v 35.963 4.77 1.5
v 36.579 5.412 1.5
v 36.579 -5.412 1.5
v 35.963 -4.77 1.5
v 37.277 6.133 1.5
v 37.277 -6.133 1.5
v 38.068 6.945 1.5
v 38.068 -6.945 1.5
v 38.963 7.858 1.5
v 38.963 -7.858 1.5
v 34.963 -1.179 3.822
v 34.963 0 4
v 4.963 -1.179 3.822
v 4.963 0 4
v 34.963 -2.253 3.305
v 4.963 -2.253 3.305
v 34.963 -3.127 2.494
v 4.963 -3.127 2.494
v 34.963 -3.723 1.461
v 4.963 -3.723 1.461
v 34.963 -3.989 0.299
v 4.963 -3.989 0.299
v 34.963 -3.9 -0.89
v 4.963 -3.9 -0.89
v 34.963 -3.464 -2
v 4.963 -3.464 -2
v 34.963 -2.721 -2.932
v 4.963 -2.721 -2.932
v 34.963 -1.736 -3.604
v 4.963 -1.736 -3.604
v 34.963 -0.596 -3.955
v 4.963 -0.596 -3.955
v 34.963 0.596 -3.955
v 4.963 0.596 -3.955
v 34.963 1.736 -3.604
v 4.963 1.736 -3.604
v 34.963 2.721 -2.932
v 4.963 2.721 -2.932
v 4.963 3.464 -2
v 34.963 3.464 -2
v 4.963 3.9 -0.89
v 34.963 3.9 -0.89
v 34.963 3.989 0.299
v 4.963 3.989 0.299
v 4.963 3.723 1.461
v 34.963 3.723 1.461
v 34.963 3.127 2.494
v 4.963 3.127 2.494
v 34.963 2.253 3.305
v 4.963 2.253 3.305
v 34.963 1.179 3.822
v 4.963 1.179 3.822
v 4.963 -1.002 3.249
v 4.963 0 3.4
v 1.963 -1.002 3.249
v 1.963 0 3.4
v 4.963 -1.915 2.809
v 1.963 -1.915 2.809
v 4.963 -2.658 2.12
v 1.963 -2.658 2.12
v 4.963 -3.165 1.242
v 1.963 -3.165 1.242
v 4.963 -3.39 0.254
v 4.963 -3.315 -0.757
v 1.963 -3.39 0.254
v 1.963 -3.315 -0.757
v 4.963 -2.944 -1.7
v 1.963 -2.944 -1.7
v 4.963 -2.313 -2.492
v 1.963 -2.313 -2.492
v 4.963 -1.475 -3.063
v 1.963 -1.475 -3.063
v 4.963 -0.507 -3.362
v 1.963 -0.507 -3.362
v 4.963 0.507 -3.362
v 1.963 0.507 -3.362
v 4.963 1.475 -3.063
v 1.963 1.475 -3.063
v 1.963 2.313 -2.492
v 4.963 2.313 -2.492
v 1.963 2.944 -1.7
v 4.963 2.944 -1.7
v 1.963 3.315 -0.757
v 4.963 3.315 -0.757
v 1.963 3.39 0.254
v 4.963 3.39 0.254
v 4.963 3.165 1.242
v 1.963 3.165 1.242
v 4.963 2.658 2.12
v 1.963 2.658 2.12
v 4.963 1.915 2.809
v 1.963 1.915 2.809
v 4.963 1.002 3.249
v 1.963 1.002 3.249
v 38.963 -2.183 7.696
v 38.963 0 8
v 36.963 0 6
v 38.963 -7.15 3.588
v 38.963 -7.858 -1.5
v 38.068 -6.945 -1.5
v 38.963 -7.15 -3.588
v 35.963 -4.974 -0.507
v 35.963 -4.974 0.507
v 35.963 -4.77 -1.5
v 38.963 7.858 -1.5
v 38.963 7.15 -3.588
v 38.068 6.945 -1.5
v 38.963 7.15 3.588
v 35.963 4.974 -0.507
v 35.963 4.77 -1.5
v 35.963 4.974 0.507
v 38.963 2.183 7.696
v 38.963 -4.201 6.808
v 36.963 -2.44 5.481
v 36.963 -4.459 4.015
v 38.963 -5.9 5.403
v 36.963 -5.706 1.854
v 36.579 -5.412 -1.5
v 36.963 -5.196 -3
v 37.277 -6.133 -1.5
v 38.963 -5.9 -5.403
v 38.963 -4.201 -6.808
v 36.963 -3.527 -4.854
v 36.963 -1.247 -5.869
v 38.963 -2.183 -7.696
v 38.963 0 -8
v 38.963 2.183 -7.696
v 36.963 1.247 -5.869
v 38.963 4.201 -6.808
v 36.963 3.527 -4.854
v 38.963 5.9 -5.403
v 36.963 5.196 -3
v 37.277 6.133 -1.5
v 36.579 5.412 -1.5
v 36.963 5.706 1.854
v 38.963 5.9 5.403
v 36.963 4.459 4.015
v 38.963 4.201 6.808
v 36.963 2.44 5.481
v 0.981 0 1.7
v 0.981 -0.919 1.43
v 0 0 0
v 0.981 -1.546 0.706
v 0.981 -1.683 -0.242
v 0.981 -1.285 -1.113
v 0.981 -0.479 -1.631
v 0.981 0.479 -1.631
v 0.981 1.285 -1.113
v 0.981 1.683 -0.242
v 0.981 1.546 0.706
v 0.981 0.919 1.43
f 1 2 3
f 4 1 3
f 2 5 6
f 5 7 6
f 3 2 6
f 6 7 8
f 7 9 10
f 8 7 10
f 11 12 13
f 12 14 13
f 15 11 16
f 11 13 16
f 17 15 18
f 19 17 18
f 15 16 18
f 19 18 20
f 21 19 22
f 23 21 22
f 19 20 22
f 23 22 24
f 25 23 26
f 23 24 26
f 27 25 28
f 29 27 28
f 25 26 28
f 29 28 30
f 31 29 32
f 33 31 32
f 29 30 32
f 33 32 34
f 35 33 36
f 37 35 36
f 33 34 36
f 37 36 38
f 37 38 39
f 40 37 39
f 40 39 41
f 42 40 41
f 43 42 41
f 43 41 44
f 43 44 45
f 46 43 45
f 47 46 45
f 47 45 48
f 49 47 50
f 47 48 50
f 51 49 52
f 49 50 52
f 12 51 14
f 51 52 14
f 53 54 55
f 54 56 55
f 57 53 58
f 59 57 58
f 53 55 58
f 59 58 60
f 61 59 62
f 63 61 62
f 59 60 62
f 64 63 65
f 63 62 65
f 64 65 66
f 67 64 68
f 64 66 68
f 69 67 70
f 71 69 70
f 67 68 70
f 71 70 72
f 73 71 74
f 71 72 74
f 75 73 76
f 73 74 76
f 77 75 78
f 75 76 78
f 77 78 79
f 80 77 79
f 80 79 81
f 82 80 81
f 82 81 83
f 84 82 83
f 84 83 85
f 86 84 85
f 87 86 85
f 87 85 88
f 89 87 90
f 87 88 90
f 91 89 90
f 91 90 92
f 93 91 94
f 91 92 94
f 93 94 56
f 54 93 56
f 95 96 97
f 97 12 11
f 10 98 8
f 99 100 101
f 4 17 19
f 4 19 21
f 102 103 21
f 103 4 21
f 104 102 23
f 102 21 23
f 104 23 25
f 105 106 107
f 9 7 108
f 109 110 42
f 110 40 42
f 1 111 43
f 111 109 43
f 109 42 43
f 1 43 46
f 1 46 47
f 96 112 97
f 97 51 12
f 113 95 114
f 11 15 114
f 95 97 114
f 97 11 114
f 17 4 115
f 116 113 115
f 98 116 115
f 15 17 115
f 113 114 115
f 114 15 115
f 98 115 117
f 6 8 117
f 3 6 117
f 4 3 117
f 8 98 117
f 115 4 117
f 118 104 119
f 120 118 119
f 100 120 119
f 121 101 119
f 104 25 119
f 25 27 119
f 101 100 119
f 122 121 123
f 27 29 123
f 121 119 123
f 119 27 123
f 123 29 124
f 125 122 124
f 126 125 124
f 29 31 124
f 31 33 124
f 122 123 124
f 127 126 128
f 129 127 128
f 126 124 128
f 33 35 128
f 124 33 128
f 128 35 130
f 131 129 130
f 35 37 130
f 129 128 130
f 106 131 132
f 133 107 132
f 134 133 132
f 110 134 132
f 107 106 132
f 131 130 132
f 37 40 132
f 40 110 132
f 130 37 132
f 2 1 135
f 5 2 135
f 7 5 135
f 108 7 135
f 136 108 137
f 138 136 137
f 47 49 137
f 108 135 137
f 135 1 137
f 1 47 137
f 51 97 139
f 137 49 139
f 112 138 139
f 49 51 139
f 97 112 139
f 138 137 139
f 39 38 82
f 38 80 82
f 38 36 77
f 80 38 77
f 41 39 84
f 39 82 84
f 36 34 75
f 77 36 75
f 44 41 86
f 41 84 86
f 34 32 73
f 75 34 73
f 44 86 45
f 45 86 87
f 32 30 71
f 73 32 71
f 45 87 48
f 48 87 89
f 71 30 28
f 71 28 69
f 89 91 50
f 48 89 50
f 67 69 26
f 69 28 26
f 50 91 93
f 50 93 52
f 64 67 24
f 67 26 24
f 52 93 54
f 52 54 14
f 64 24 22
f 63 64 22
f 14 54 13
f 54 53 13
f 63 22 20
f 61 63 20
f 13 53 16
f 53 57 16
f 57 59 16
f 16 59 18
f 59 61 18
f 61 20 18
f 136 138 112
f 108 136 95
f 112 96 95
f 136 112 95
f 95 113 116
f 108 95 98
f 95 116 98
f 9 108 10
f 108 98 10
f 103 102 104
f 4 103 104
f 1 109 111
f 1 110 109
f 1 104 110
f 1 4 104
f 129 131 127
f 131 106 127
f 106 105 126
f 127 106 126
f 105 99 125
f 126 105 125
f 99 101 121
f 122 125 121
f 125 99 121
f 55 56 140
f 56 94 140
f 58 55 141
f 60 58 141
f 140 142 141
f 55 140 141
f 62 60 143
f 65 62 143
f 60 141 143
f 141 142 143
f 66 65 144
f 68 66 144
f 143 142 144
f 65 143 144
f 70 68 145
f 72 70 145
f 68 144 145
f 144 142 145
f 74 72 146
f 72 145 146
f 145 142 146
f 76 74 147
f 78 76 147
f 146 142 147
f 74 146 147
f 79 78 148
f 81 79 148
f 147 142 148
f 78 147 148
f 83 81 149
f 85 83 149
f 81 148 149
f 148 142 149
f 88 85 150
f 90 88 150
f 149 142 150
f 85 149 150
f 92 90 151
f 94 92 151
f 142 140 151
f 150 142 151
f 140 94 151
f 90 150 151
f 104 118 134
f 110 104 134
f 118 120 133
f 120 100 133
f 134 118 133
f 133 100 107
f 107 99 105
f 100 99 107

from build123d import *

# Parameters (mm, degrees)
F3_DEPTH = 3


with BuildPart() as f1:
    # F0 (on Front) → F1 (revolve)
    with BuildSketch(Plane.XZ):
        Polygon((34.962991, 4), (34.962991, 0), (38.962991, 0), (38.962991, 8), align=None)
        Polygon((4.962991, 3.4), (4.962991, 0), (34.962991, 0), (34.962991, 4), (4.962991, 4), align=None)
        Polygon((1.962991, 3.4), (0, 0), (4.962991, 0), (4.962991, 3.4), align=None)
    revolve(axis=Axis((9.715057, 0, 0), (1, 0, 0)))

    # F2 (on face) → F3 (cut)
    with BuildSketch(Plane.YZ.offset(38.962991)):
        with BuildLine():
            Line((7.858117, 1.5), (-7.858117, 1.5))
            ThreePointArc((-7.858117, 1.5), (-8, 0), (-7.858117, -1.5))
            Line((-7.858117, -1.5), (7.858117, -1.5))
            ThreePointArc((7.858117, -1.5), (7.96445, -0.753348), (8, 0))
            ThreePointArc((8, 0), (7.96445, 0.753348), (7.858117, 1.5))
        make_face()
    extrude(amount=-F3_DEPTH, mode=Mode.SUBTRACT)


solid = f1.part
